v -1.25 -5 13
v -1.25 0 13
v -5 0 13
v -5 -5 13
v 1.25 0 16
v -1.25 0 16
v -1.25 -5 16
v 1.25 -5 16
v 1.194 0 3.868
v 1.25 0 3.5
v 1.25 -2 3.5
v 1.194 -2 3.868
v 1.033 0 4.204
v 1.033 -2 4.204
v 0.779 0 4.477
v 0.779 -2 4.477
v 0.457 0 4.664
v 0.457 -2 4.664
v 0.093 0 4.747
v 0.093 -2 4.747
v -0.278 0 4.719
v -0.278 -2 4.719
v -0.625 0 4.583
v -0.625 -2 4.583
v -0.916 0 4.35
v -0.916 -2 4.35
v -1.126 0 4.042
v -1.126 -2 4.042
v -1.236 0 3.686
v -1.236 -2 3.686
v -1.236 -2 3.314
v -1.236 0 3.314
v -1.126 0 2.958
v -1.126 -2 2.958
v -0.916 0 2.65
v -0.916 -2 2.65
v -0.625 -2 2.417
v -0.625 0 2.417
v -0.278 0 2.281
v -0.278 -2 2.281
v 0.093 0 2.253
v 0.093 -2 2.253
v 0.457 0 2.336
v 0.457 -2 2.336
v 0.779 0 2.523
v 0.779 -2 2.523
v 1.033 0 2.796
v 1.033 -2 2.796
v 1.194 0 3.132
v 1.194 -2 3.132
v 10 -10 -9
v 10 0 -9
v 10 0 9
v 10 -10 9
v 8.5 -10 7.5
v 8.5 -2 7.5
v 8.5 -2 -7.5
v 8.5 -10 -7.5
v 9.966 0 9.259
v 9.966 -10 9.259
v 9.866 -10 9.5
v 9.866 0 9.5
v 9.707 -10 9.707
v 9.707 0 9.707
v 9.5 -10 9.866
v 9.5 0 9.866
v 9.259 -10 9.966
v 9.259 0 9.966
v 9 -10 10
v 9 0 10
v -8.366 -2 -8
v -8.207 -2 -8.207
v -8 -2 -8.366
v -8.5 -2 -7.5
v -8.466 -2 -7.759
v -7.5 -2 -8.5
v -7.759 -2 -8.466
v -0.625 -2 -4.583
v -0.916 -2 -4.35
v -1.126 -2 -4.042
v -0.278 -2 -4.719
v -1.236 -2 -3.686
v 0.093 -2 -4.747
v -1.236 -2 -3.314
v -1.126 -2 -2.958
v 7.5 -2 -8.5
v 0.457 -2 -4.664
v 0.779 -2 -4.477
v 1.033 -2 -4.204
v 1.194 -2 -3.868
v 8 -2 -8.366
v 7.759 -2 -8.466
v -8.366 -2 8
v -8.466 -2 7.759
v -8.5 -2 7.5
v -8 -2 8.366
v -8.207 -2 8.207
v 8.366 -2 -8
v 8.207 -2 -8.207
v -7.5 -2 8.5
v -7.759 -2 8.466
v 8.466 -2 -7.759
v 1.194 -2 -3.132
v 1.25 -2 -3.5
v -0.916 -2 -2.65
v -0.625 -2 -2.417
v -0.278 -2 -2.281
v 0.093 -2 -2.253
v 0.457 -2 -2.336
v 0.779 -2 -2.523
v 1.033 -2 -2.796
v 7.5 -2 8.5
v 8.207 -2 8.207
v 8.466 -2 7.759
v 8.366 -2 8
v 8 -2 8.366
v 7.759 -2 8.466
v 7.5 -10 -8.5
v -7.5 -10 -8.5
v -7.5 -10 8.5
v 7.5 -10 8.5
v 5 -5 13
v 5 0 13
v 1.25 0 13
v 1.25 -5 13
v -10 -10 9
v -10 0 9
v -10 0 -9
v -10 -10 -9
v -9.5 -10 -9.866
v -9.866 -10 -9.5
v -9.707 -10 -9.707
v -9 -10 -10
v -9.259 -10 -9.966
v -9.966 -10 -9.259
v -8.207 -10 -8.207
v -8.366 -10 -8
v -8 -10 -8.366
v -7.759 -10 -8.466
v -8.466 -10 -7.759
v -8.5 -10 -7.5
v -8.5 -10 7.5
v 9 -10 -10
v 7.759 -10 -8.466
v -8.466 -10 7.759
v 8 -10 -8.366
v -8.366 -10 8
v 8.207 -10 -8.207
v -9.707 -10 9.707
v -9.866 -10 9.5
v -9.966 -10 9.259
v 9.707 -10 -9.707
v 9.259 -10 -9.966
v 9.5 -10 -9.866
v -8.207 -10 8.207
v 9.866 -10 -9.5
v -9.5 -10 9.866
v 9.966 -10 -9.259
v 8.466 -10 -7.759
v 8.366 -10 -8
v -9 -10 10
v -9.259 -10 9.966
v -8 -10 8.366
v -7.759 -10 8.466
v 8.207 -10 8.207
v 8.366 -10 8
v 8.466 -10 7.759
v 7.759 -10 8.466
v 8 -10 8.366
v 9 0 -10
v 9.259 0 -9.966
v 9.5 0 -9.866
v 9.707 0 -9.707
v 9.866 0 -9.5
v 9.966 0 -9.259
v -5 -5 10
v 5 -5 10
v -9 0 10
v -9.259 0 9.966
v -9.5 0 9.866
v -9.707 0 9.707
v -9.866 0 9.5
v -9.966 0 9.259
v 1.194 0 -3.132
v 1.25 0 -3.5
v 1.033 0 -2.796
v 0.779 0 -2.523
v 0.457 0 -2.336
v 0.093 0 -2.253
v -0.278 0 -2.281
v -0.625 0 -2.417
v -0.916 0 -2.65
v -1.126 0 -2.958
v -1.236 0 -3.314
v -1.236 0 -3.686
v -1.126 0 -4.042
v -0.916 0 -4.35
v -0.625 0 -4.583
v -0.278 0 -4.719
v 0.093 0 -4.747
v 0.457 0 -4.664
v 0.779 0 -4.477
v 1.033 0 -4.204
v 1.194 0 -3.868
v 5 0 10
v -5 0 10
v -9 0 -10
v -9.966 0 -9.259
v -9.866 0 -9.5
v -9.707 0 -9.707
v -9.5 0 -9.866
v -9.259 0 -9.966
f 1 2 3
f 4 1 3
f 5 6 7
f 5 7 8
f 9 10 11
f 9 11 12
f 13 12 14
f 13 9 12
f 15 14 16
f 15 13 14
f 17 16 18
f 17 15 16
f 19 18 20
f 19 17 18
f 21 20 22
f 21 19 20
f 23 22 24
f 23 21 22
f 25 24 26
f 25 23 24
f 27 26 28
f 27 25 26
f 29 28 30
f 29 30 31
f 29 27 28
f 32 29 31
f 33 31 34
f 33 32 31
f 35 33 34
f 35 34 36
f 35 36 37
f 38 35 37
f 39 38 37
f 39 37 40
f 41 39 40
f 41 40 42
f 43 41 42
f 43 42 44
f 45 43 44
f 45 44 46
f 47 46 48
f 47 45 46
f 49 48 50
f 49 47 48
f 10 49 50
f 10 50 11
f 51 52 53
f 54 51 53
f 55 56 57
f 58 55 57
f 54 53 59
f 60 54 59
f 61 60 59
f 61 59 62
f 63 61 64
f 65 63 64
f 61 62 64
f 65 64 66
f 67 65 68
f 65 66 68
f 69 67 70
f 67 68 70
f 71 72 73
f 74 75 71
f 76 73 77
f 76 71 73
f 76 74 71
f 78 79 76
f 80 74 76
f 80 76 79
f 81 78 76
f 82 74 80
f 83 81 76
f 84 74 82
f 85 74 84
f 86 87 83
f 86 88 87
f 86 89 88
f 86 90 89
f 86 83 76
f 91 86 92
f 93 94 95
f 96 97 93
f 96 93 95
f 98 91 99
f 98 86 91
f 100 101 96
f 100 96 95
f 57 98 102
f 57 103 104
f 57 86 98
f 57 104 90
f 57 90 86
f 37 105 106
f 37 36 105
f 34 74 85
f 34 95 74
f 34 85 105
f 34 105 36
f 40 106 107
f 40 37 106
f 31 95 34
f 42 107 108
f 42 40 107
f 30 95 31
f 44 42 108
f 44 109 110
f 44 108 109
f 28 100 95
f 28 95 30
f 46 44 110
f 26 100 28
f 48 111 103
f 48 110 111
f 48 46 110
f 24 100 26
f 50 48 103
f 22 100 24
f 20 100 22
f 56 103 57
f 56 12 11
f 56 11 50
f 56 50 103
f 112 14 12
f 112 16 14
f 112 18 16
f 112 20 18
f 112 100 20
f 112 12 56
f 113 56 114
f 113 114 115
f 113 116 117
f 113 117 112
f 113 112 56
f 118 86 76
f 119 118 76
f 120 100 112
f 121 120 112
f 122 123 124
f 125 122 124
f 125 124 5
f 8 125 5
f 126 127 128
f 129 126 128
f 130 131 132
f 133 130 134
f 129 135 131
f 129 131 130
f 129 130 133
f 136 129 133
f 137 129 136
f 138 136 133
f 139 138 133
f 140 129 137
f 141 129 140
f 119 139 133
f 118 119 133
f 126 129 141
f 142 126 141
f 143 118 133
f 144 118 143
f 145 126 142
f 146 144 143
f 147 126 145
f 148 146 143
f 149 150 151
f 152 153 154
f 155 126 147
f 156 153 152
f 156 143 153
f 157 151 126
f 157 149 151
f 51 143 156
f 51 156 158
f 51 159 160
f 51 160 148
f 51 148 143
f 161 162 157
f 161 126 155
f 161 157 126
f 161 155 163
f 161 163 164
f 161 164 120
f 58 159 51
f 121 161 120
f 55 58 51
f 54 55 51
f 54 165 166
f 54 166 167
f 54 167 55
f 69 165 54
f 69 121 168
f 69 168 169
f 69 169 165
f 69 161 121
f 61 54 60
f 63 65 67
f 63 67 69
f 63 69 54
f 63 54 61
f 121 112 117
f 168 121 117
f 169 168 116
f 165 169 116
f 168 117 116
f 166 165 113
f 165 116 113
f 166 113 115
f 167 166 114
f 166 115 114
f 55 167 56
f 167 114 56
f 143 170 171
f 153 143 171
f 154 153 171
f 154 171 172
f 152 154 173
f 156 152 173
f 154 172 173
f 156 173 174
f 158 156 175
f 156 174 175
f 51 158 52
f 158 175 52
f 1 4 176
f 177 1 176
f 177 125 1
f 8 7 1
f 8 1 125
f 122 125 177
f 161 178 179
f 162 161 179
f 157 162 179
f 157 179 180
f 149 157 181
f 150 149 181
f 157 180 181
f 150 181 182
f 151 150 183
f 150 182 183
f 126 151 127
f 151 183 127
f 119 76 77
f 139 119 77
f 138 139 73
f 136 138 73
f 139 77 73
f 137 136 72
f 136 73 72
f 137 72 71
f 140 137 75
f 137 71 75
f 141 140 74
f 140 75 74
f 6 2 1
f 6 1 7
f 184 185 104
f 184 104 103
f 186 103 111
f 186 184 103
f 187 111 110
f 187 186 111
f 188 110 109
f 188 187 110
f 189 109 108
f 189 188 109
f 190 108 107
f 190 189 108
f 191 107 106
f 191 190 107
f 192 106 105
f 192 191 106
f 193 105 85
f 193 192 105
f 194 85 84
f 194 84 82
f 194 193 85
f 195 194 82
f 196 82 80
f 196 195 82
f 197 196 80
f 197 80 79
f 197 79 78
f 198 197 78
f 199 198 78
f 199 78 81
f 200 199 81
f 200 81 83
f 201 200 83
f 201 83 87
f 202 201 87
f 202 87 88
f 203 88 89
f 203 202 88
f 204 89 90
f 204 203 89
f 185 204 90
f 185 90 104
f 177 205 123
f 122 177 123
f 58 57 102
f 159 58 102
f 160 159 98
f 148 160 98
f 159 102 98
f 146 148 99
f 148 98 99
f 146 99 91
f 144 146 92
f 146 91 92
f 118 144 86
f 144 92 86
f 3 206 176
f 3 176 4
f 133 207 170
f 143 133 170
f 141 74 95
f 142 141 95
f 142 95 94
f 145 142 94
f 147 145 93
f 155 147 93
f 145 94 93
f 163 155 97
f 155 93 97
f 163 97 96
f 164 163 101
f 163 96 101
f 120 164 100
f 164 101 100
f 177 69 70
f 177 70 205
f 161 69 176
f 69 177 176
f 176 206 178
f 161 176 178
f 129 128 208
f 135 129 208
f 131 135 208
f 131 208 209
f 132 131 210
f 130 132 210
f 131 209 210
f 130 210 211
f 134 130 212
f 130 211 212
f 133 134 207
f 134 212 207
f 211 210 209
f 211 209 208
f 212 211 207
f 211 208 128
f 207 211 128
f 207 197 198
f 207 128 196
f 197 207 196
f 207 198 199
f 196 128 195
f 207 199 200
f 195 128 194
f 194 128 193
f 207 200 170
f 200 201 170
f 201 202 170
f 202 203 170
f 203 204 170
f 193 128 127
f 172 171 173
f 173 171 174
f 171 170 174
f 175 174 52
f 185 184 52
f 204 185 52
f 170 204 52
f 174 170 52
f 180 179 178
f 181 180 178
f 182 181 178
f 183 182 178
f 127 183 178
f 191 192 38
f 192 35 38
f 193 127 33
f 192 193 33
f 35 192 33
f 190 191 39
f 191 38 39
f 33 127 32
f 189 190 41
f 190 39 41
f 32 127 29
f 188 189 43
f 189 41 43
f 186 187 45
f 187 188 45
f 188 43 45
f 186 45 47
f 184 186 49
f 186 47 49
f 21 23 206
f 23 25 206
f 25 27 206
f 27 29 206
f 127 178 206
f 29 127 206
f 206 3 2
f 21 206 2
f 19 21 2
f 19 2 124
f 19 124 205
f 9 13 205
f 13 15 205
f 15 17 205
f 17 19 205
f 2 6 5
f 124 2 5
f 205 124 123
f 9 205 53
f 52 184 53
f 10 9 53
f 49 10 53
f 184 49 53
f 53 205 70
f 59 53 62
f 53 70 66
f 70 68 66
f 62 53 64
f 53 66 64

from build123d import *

# Parameters (mm, degrees)
F0_W     = 2.5
F0_H     = 3
F1_DEPTH = 5
F0_R     = 1.25
F2_DEPTH = 2
F3_DEPTH = 10
F0_W_2   = 3.75
F4_DEPTH = 5


with BuildPart() as f1:
    # F0 (on Front) → F1 (new body)
    with BuildSketch(Plane.XZ):
        with Locations((0, 14.5)):
            Rectangle(F0_W, F0_H)
    extrude(amount=F1_DEPTH)



with BuildPart() as f2:
    # F0 (on Front) → F2 (new body)
    with BuildSketch(Plane.XZ):
        with BuildLine():
            Line((-7.5, -8.5), (7.5, -8.5))
            ThreePointArc((7.5, -8.5), (8.2071067812, -8.2071067812), (8.5, -7.5))
            Line((8.5, -7.5), (8.5, 7.5))
            ThreePointArc((8.5, 7.5), (8.2071067812, 8.2071067812), (7.5, 8.5))
            Line((7.5, 8.5), (-7.5, 8.5))
            ThreePointArc((-7.5, 8.5), (-8.2071067812, 8.2071067812), (-8.5, 7.5))
            Line((-8.5, 7.5), (-8.5, -7.5))
            ThreePointArc((-8.5, -7.5), (-8.2071067812, -8.2071067812), (-7.5, -8.5))
        make_face()
        with Locations((0, -3.5)):
            Circle(F0_R, mode=Mode.SUBTRACT)
        with Locations((0, 3.5)):
            Circle(F0_R, mode=Mode.SUBTRACT)
    extrude(amount=F2_DEPTH)

    # F0 (on Front) → F3 (join)
    with BuildSketch(Plane.XZ):
        with BuildLine():
            Line((5, 10), (1.25, 10))
            Line((1.25, 10), (-1.25, 10))
            Line((-1.25, 10), (-5, 10))
            Line((-5, 10), (-9, 10))
            ThreePointArc((-9, 10), (-9.7071067812, 9.7071067812), (-10, 9))
            Line((-10, 9), (-10, -9))
            ThreePointArc((-10, -9), (-9.7071067812, -9.7071067812), (-9, -10))
            Line((-9, -10), (9, -10))
            ThreePointArc((9, -10), (9.7071067812, -9.7071067812), (10, -9))
            Line((10, -9), (10, 9))
            ThreePointArc((10, 9), (9.7071067812, 9.7071067812), (9, 10))
            Line((9, 10), (5, 10))
        make_face()
        with BuildLine():
            ThreePointArc((8.5, -7.5), (8.2071067812, -8.2071067812), (7.5, -8.5))
            Line((7.5, -8.5), (-7.5, -8.5))
            ThreePointArc((-7.5, -8.5), (-8.2071067812, -8.2071067812), (-8.5, -7.5))
            Line((-8.5, -7.5), (-8.5, 7.5))
            ThreePointArc((-8.5, 7.5), (-8.2071067812, 8.2071067812), (-7.5, 8.5))
            Line((-7.5, 8.5), (7.5, 8.5))
            ThreePointArc((7.5, 8.5), (8.2071067812, 8.2071067812), (8.5, 7.5))
            Line((8.5, 7.5), (8.5, -7.5))
        make_face(mode=Mode.SUBTRACT)
    extrude(amount=F3_DEPTH)


with BuildPart() as f1_1:
    add(f1.part)

    add(f2.part)  # F4 merges F2
    # F0 (on Front) → F4 (join)
    with BuildSketch(Plane.XZ):
        with Locations((-3.125, 11.5)):
            Rectangle(F0_W_2, F0_H)
        with Locations((0, 11.5)):
            Rectangle(F0_W, F0_H)
        with Locations((3.125, 11.5)):
            Rectangle(F0_W_2, F0_H)
    extrude(amount=F4_DEPTH)


solid = f1_1.part
